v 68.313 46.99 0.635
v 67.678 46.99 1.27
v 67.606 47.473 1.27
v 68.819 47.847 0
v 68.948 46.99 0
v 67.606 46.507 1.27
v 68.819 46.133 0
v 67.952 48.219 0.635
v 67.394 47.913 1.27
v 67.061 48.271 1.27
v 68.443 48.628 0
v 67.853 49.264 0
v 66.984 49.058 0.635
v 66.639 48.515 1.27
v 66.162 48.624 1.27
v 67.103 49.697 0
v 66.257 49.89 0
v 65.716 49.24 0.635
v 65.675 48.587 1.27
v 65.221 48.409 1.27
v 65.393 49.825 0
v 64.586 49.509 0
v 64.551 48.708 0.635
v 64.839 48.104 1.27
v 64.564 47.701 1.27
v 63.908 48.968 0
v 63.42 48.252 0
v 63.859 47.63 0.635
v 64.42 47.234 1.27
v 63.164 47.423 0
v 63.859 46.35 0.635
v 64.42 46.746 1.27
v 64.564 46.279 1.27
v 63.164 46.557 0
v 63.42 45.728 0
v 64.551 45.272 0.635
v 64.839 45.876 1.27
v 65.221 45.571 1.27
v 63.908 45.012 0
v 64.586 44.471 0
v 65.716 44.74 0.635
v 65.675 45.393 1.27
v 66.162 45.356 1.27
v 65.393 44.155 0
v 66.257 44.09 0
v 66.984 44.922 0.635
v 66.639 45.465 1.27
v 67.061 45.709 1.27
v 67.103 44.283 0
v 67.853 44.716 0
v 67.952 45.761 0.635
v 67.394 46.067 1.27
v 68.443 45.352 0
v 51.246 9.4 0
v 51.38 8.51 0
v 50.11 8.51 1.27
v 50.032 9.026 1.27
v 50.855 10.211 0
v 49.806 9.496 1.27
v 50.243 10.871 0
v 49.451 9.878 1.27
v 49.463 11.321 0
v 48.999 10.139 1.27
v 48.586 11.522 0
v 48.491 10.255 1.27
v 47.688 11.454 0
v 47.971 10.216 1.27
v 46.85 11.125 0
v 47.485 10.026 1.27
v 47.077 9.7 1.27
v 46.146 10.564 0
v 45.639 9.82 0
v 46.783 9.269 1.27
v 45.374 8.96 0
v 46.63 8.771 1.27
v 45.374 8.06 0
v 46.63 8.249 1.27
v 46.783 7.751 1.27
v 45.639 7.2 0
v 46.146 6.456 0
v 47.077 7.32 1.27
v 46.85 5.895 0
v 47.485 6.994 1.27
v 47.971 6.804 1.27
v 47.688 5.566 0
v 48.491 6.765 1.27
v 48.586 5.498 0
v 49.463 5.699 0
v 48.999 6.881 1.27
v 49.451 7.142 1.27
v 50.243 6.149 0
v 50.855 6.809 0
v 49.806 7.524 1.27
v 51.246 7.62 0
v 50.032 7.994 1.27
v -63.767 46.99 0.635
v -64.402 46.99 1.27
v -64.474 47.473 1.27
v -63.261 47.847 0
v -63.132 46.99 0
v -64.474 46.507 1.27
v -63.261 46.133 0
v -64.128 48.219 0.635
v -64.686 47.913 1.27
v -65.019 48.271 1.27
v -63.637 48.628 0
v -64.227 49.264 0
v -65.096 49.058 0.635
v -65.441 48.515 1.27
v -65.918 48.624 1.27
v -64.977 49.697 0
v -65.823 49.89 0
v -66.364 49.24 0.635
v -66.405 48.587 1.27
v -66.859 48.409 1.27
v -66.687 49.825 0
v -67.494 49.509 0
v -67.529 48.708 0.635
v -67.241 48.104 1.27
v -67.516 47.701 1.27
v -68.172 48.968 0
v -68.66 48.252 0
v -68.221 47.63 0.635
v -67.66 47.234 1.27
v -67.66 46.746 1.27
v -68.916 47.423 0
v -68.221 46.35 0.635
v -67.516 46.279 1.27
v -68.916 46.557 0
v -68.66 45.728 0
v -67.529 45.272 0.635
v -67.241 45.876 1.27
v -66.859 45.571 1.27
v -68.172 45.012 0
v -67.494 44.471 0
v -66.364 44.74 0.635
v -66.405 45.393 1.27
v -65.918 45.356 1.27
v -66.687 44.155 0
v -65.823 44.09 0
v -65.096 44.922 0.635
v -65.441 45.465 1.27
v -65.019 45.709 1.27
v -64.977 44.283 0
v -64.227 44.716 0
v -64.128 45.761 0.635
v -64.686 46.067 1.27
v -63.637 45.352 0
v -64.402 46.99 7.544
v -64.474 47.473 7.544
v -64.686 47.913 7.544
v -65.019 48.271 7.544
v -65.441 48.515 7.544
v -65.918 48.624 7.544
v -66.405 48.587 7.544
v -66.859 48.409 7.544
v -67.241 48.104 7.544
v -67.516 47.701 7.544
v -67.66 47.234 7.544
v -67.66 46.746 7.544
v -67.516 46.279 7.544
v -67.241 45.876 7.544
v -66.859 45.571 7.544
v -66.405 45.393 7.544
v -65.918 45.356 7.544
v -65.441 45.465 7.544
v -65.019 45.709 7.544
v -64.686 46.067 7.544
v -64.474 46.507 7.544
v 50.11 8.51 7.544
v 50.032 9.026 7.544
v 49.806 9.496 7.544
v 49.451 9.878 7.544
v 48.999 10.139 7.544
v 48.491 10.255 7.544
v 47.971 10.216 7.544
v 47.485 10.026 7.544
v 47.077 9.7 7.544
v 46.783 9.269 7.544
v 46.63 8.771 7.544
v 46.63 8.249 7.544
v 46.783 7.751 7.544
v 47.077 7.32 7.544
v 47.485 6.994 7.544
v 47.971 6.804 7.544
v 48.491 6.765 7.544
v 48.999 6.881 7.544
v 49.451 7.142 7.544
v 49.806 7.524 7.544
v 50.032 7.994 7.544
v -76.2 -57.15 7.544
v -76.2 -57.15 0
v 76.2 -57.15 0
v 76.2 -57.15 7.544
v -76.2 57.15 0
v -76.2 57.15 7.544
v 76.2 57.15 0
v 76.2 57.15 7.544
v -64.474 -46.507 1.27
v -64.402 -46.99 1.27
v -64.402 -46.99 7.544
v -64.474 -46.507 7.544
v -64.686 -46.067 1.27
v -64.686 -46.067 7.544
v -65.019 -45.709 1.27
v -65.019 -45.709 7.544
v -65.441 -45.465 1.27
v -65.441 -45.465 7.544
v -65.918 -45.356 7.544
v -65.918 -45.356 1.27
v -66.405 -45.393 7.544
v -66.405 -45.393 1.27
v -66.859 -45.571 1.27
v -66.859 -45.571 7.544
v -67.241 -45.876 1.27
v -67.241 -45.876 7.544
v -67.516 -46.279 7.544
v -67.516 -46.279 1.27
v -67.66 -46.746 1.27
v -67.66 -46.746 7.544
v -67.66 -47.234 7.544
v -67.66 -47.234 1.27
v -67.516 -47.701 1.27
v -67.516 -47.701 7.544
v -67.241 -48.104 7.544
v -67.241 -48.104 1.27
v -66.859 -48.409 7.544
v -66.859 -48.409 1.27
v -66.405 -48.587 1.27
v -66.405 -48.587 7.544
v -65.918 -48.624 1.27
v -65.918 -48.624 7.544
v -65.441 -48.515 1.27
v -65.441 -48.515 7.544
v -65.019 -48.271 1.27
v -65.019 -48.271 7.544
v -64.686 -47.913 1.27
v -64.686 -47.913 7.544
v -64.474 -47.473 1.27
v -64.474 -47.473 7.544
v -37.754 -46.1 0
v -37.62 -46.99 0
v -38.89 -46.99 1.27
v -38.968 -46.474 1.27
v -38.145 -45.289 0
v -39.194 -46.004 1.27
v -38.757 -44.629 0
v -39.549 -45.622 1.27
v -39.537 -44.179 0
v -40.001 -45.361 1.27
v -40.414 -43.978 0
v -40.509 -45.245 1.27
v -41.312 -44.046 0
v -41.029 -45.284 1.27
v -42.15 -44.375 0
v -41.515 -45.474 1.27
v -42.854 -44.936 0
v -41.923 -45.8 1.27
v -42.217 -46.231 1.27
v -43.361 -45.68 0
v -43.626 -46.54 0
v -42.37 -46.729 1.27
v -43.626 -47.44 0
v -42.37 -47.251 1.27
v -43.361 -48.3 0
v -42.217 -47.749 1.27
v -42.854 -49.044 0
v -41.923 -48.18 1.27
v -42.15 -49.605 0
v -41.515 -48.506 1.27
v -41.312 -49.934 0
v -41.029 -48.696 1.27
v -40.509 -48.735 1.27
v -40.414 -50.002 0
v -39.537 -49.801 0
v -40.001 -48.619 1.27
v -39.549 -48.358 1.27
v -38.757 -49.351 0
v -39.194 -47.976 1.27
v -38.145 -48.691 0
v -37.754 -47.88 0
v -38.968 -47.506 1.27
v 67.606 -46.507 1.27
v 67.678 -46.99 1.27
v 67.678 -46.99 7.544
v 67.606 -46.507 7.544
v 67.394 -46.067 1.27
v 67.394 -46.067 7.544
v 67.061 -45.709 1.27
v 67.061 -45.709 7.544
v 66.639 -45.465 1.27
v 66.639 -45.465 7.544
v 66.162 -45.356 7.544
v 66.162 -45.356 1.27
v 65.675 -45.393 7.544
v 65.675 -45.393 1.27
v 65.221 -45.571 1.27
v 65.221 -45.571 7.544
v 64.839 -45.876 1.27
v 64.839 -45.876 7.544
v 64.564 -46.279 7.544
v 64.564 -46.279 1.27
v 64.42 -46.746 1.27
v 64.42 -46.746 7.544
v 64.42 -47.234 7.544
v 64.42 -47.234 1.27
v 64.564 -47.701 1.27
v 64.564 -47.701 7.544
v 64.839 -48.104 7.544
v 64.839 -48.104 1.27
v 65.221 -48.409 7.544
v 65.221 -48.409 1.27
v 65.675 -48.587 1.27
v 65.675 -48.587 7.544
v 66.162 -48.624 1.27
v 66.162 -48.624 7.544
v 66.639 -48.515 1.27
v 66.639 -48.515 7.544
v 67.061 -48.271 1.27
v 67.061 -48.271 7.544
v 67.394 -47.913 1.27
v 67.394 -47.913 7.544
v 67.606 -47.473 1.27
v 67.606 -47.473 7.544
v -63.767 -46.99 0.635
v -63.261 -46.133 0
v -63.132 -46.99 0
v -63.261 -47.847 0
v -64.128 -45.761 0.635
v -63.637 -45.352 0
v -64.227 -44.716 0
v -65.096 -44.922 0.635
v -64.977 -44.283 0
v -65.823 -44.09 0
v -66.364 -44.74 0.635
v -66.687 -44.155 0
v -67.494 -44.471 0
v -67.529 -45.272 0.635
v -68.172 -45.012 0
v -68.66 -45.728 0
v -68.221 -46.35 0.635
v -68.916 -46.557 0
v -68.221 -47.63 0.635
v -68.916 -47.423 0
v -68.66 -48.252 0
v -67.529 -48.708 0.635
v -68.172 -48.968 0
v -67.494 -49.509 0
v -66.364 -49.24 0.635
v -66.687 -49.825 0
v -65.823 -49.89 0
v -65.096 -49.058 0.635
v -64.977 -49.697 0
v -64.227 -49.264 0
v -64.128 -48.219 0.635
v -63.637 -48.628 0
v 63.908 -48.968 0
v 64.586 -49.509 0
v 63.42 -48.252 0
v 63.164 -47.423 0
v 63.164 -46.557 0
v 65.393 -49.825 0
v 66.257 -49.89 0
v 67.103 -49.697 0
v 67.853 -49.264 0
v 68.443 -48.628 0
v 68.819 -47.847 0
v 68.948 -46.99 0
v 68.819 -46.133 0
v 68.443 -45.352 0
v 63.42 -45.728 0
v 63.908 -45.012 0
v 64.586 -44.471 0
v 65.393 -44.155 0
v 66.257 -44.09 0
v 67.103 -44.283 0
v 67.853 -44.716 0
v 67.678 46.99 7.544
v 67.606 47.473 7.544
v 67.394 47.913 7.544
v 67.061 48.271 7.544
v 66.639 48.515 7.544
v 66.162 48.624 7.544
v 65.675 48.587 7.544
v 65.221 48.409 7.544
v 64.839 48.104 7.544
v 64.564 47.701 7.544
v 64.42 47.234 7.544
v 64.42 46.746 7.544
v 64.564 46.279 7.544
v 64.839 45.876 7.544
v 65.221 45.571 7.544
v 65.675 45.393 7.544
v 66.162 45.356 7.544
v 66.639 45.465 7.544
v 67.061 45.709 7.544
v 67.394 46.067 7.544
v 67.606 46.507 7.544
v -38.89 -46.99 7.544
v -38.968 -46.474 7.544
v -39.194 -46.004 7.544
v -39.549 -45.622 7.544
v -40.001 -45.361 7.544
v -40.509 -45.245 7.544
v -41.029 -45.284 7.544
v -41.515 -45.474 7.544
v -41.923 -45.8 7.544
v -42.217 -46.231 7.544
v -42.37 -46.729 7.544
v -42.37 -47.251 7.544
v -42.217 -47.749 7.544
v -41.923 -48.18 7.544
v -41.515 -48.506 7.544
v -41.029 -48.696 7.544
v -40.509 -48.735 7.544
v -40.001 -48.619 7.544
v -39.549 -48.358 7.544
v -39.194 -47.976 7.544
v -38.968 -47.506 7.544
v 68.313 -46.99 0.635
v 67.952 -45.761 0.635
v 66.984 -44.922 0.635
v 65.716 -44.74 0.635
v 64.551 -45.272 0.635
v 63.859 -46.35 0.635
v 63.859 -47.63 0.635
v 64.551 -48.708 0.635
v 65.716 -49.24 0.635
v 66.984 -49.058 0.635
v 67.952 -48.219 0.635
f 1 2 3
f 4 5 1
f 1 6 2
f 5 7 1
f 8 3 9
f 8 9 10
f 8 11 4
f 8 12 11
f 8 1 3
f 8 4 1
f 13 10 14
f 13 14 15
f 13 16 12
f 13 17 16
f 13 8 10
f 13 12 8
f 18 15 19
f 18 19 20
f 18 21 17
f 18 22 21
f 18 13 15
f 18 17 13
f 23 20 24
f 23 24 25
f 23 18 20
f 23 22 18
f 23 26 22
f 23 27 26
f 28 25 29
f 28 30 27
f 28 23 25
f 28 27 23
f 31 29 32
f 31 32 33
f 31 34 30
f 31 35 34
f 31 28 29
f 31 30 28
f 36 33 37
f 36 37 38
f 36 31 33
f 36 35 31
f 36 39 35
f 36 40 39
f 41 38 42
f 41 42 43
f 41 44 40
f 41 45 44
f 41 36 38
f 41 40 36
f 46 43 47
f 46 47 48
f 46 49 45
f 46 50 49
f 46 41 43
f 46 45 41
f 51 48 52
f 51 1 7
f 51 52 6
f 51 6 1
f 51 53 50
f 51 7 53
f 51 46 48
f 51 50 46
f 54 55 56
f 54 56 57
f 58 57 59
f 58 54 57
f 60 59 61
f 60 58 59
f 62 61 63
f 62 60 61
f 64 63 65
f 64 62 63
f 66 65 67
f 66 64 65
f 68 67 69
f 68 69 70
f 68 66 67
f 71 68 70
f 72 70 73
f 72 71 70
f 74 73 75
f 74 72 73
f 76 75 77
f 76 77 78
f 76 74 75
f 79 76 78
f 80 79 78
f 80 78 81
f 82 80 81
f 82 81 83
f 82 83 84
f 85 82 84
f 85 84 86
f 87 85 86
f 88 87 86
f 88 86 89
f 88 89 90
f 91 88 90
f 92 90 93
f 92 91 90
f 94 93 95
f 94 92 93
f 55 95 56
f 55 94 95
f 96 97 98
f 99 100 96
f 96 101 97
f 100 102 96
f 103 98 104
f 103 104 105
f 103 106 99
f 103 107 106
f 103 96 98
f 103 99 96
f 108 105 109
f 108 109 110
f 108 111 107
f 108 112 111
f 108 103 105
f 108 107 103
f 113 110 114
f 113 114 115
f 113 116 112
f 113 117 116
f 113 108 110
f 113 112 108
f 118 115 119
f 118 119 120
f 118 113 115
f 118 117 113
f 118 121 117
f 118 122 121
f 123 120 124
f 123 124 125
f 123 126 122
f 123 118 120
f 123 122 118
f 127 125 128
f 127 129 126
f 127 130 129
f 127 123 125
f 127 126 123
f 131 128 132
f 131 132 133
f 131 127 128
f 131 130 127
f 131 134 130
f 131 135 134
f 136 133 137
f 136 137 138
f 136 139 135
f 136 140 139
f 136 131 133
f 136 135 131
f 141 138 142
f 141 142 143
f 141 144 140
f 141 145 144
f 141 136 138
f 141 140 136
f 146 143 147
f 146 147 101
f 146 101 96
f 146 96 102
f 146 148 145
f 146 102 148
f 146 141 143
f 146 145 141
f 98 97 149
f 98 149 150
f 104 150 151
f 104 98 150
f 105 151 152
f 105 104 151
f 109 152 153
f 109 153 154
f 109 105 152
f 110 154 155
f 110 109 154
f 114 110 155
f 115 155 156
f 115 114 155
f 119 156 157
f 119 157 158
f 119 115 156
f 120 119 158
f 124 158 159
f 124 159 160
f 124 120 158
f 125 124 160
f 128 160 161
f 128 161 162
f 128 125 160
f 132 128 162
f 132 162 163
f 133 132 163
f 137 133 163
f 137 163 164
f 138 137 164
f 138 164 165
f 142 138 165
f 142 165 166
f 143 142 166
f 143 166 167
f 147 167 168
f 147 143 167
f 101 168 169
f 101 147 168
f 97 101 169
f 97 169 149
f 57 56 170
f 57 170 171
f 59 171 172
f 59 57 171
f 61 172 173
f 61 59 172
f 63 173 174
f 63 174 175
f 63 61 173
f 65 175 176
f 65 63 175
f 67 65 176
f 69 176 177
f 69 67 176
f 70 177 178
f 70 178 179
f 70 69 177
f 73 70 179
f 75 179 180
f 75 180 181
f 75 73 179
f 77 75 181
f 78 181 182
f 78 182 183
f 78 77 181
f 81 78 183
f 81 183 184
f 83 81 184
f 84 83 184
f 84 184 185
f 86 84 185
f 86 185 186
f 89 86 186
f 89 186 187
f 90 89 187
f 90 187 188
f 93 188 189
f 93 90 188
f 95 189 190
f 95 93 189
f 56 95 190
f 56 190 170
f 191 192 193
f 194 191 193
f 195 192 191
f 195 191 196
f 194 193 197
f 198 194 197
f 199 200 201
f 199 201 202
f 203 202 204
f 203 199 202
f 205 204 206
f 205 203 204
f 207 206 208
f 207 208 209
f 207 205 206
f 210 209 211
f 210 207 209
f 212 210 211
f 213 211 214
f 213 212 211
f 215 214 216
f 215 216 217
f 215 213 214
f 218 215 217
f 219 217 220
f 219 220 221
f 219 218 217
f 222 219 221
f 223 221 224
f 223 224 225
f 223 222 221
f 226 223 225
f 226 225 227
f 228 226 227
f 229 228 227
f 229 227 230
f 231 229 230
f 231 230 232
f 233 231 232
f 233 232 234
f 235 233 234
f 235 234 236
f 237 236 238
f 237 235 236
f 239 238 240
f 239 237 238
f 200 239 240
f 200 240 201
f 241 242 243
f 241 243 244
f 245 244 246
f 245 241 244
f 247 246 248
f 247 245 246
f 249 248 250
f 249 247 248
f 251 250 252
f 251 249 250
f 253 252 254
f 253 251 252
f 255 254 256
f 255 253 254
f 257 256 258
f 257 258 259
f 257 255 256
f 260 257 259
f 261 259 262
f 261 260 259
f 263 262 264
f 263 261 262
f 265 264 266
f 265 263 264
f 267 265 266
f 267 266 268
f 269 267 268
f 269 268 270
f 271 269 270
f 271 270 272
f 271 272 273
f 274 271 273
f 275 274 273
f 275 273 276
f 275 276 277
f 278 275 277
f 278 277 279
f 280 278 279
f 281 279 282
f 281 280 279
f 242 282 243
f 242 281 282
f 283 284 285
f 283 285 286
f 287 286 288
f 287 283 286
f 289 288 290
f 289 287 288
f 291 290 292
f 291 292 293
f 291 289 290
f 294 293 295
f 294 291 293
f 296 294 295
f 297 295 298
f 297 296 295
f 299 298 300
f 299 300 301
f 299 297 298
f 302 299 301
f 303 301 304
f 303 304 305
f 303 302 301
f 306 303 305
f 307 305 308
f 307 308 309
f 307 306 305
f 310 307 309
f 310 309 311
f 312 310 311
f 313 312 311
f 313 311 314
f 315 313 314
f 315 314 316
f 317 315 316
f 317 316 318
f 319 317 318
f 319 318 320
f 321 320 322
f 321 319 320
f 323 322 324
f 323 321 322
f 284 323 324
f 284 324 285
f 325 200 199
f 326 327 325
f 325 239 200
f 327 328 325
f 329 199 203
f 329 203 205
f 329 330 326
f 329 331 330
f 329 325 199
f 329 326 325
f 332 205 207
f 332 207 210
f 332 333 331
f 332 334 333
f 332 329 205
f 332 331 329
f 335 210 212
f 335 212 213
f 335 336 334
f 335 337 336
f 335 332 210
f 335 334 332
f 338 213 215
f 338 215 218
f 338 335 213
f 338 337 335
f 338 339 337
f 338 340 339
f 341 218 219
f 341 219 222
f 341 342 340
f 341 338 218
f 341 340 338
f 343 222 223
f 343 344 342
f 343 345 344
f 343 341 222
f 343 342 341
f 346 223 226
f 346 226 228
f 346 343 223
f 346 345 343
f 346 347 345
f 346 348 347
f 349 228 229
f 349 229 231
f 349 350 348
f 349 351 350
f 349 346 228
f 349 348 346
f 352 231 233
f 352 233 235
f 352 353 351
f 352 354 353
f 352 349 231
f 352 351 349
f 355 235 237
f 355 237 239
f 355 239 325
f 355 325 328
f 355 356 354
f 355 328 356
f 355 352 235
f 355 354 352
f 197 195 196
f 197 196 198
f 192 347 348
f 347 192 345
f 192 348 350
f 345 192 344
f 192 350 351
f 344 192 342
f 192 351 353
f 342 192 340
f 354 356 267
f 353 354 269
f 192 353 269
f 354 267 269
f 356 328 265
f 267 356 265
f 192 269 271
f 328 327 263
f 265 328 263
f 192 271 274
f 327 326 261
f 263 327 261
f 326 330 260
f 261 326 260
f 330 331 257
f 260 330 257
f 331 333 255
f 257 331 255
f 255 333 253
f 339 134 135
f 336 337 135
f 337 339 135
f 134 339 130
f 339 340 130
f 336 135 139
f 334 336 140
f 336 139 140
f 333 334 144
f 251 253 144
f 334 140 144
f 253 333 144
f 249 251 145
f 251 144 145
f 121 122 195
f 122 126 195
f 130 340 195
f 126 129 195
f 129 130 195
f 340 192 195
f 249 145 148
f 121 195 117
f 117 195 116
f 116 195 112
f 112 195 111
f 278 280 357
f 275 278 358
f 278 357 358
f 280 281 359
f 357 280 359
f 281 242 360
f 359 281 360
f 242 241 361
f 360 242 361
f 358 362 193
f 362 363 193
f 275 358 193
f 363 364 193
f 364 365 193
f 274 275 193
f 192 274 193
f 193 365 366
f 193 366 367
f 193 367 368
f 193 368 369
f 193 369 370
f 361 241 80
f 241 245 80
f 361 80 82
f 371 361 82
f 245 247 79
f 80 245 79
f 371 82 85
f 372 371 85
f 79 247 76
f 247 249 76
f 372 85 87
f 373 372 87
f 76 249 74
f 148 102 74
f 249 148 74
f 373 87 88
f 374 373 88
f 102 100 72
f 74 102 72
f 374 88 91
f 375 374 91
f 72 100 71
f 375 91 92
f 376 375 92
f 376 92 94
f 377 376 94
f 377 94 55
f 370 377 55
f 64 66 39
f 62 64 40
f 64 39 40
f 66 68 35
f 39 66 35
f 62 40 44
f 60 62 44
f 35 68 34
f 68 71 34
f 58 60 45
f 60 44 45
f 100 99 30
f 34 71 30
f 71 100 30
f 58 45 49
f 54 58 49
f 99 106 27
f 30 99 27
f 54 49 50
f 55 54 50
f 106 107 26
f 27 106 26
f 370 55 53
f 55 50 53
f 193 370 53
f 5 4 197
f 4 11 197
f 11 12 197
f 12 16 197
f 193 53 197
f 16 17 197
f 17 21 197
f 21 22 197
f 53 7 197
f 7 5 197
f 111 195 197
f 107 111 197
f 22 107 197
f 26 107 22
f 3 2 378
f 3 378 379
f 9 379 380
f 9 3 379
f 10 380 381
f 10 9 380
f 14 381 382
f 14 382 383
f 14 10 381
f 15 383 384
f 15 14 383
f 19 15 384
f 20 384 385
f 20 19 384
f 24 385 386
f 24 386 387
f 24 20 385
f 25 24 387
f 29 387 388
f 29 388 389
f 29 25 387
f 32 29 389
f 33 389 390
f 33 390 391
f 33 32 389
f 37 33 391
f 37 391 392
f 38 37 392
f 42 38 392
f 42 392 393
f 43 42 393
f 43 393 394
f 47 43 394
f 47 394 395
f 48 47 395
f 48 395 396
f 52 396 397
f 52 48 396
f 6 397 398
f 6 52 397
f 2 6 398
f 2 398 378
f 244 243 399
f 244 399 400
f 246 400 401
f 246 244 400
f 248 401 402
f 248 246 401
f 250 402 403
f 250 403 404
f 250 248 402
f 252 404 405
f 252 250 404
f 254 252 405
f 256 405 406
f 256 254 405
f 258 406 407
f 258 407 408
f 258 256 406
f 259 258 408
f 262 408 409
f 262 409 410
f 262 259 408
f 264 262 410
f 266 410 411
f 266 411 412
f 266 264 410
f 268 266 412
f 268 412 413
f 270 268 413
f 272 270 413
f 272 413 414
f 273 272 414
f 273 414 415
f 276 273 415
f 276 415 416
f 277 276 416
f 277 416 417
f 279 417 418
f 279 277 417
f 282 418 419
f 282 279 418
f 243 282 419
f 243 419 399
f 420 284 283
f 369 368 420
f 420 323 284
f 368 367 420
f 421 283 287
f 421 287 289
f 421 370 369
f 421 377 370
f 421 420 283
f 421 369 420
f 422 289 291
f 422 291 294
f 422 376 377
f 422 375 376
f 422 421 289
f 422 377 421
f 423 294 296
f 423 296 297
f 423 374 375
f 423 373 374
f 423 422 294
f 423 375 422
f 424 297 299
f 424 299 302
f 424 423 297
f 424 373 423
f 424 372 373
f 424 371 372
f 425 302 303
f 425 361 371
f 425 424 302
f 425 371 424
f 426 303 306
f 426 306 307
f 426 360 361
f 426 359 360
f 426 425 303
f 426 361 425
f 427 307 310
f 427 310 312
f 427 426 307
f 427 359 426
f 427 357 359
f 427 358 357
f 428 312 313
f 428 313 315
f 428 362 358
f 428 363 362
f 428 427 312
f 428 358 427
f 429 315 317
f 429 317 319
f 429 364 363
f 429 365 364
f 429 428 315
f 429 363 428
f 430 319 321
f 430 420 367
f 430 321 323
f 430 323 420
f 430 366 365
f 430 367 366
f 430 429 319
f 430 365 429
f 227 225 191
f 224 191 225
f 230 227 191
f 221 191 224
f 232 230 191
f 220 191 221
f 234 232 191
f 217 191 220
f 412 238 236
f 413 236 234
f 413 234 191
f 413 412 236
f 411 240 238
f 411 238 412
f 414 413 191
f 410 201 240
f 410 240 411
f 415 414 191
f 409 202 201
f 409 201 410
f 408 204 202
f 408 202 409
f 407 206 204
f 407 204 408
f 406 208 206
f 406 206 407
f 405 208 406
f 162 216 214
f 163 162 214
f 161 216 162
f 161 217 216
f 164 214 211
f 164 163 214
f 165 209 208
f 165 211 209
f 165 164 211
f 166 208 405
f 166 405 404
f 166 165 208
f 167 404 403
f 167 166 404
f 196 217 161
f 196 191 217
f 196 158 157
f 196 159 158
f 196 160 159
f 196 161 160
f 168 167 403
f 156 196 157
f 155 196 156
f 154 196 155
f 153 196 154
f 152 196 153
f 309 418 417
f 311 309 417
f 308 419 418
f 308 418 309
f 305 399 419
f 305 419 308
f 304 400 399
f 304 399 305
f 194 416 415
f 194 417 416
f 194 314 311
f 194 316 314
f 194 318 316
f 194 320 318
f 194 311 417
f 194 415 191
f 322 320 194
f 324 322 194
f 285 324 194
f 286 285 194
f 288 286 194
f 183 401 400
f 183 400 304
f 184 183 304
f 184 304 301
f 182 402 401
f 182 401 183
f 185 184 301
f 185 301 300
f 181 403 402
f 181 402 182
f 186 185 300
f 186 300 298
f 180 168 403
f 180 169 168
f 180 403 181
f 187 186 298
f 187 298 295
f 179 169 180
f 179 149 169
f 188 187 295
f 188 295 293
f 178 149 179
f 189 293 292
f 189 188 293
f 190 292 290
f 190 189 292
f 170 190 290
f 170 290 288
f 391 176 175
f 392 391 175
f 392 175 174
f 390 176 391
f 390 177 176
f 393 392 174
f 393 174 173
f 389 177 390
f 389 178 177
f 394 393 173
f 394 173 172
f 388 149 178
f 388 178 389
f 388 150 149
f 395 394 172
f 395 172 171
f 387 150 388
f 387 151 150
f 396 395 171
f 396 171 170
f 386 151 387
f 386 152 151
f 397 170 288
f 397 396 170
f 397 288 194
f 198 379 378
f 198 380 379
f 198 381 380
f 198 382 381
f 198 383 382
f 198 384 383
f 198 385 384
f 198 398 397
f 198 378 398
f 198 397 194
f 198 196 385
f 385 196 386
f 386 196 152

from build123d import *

# Parameters (mm, degrees)
F0_W     = 152.4
F0_H     = 114.3
F0_R     = 1.6383
F0_R_2   = 1.75
F1_DEPTH = 7.5438
F2_SIZE  = 1.27


with BuildPart() as f1:
    # F0 (on Top) → F1 (new body)
    with BuildSketch(Plane.XY):
        Rectangle(F0_W, F0_H)
        with Locations((-66.04, -46.99)):
            Circle(F0_R, mode=Mode.SUBTRACT)
        with Locations((-40.64, -46.99)):
            Circle(F0_R_2, mode=Mode.SUBTRACT)
        with Locations((66.04, -46.99)):
            Circle(F0_R, mode=Mode.SUBTRACT)
        with Locations((-66.04, 46.99)):
            Circle(F0_R, mode=Mode.SUBTRACT)
        with Locations((48.36, 8.51)):
            Circle(F0_R_2, mode=Mode.SUBTRACT)
        with Locations((66.04, 46.99)):
            Circle(F0_R, mode=Mode.SUBTRACT)
    extrude(amount=F1_DEPTH)

    # F2
    f2_edges = [f1.edges().sort_by_distance(p)[0] for p in [
        (-67.6783, -46.99, 0),
        (-42.39, -46.99, 0),
        (46.61, 8.51, 0),
        (64.4017, 46.99, 0),
        (64.4017, -46.99, 0),
        (-67.6783, 46.99, 0),
    ]]
    chamfer(f2_edges, length=F2_SIZE)


solid = f1.part
